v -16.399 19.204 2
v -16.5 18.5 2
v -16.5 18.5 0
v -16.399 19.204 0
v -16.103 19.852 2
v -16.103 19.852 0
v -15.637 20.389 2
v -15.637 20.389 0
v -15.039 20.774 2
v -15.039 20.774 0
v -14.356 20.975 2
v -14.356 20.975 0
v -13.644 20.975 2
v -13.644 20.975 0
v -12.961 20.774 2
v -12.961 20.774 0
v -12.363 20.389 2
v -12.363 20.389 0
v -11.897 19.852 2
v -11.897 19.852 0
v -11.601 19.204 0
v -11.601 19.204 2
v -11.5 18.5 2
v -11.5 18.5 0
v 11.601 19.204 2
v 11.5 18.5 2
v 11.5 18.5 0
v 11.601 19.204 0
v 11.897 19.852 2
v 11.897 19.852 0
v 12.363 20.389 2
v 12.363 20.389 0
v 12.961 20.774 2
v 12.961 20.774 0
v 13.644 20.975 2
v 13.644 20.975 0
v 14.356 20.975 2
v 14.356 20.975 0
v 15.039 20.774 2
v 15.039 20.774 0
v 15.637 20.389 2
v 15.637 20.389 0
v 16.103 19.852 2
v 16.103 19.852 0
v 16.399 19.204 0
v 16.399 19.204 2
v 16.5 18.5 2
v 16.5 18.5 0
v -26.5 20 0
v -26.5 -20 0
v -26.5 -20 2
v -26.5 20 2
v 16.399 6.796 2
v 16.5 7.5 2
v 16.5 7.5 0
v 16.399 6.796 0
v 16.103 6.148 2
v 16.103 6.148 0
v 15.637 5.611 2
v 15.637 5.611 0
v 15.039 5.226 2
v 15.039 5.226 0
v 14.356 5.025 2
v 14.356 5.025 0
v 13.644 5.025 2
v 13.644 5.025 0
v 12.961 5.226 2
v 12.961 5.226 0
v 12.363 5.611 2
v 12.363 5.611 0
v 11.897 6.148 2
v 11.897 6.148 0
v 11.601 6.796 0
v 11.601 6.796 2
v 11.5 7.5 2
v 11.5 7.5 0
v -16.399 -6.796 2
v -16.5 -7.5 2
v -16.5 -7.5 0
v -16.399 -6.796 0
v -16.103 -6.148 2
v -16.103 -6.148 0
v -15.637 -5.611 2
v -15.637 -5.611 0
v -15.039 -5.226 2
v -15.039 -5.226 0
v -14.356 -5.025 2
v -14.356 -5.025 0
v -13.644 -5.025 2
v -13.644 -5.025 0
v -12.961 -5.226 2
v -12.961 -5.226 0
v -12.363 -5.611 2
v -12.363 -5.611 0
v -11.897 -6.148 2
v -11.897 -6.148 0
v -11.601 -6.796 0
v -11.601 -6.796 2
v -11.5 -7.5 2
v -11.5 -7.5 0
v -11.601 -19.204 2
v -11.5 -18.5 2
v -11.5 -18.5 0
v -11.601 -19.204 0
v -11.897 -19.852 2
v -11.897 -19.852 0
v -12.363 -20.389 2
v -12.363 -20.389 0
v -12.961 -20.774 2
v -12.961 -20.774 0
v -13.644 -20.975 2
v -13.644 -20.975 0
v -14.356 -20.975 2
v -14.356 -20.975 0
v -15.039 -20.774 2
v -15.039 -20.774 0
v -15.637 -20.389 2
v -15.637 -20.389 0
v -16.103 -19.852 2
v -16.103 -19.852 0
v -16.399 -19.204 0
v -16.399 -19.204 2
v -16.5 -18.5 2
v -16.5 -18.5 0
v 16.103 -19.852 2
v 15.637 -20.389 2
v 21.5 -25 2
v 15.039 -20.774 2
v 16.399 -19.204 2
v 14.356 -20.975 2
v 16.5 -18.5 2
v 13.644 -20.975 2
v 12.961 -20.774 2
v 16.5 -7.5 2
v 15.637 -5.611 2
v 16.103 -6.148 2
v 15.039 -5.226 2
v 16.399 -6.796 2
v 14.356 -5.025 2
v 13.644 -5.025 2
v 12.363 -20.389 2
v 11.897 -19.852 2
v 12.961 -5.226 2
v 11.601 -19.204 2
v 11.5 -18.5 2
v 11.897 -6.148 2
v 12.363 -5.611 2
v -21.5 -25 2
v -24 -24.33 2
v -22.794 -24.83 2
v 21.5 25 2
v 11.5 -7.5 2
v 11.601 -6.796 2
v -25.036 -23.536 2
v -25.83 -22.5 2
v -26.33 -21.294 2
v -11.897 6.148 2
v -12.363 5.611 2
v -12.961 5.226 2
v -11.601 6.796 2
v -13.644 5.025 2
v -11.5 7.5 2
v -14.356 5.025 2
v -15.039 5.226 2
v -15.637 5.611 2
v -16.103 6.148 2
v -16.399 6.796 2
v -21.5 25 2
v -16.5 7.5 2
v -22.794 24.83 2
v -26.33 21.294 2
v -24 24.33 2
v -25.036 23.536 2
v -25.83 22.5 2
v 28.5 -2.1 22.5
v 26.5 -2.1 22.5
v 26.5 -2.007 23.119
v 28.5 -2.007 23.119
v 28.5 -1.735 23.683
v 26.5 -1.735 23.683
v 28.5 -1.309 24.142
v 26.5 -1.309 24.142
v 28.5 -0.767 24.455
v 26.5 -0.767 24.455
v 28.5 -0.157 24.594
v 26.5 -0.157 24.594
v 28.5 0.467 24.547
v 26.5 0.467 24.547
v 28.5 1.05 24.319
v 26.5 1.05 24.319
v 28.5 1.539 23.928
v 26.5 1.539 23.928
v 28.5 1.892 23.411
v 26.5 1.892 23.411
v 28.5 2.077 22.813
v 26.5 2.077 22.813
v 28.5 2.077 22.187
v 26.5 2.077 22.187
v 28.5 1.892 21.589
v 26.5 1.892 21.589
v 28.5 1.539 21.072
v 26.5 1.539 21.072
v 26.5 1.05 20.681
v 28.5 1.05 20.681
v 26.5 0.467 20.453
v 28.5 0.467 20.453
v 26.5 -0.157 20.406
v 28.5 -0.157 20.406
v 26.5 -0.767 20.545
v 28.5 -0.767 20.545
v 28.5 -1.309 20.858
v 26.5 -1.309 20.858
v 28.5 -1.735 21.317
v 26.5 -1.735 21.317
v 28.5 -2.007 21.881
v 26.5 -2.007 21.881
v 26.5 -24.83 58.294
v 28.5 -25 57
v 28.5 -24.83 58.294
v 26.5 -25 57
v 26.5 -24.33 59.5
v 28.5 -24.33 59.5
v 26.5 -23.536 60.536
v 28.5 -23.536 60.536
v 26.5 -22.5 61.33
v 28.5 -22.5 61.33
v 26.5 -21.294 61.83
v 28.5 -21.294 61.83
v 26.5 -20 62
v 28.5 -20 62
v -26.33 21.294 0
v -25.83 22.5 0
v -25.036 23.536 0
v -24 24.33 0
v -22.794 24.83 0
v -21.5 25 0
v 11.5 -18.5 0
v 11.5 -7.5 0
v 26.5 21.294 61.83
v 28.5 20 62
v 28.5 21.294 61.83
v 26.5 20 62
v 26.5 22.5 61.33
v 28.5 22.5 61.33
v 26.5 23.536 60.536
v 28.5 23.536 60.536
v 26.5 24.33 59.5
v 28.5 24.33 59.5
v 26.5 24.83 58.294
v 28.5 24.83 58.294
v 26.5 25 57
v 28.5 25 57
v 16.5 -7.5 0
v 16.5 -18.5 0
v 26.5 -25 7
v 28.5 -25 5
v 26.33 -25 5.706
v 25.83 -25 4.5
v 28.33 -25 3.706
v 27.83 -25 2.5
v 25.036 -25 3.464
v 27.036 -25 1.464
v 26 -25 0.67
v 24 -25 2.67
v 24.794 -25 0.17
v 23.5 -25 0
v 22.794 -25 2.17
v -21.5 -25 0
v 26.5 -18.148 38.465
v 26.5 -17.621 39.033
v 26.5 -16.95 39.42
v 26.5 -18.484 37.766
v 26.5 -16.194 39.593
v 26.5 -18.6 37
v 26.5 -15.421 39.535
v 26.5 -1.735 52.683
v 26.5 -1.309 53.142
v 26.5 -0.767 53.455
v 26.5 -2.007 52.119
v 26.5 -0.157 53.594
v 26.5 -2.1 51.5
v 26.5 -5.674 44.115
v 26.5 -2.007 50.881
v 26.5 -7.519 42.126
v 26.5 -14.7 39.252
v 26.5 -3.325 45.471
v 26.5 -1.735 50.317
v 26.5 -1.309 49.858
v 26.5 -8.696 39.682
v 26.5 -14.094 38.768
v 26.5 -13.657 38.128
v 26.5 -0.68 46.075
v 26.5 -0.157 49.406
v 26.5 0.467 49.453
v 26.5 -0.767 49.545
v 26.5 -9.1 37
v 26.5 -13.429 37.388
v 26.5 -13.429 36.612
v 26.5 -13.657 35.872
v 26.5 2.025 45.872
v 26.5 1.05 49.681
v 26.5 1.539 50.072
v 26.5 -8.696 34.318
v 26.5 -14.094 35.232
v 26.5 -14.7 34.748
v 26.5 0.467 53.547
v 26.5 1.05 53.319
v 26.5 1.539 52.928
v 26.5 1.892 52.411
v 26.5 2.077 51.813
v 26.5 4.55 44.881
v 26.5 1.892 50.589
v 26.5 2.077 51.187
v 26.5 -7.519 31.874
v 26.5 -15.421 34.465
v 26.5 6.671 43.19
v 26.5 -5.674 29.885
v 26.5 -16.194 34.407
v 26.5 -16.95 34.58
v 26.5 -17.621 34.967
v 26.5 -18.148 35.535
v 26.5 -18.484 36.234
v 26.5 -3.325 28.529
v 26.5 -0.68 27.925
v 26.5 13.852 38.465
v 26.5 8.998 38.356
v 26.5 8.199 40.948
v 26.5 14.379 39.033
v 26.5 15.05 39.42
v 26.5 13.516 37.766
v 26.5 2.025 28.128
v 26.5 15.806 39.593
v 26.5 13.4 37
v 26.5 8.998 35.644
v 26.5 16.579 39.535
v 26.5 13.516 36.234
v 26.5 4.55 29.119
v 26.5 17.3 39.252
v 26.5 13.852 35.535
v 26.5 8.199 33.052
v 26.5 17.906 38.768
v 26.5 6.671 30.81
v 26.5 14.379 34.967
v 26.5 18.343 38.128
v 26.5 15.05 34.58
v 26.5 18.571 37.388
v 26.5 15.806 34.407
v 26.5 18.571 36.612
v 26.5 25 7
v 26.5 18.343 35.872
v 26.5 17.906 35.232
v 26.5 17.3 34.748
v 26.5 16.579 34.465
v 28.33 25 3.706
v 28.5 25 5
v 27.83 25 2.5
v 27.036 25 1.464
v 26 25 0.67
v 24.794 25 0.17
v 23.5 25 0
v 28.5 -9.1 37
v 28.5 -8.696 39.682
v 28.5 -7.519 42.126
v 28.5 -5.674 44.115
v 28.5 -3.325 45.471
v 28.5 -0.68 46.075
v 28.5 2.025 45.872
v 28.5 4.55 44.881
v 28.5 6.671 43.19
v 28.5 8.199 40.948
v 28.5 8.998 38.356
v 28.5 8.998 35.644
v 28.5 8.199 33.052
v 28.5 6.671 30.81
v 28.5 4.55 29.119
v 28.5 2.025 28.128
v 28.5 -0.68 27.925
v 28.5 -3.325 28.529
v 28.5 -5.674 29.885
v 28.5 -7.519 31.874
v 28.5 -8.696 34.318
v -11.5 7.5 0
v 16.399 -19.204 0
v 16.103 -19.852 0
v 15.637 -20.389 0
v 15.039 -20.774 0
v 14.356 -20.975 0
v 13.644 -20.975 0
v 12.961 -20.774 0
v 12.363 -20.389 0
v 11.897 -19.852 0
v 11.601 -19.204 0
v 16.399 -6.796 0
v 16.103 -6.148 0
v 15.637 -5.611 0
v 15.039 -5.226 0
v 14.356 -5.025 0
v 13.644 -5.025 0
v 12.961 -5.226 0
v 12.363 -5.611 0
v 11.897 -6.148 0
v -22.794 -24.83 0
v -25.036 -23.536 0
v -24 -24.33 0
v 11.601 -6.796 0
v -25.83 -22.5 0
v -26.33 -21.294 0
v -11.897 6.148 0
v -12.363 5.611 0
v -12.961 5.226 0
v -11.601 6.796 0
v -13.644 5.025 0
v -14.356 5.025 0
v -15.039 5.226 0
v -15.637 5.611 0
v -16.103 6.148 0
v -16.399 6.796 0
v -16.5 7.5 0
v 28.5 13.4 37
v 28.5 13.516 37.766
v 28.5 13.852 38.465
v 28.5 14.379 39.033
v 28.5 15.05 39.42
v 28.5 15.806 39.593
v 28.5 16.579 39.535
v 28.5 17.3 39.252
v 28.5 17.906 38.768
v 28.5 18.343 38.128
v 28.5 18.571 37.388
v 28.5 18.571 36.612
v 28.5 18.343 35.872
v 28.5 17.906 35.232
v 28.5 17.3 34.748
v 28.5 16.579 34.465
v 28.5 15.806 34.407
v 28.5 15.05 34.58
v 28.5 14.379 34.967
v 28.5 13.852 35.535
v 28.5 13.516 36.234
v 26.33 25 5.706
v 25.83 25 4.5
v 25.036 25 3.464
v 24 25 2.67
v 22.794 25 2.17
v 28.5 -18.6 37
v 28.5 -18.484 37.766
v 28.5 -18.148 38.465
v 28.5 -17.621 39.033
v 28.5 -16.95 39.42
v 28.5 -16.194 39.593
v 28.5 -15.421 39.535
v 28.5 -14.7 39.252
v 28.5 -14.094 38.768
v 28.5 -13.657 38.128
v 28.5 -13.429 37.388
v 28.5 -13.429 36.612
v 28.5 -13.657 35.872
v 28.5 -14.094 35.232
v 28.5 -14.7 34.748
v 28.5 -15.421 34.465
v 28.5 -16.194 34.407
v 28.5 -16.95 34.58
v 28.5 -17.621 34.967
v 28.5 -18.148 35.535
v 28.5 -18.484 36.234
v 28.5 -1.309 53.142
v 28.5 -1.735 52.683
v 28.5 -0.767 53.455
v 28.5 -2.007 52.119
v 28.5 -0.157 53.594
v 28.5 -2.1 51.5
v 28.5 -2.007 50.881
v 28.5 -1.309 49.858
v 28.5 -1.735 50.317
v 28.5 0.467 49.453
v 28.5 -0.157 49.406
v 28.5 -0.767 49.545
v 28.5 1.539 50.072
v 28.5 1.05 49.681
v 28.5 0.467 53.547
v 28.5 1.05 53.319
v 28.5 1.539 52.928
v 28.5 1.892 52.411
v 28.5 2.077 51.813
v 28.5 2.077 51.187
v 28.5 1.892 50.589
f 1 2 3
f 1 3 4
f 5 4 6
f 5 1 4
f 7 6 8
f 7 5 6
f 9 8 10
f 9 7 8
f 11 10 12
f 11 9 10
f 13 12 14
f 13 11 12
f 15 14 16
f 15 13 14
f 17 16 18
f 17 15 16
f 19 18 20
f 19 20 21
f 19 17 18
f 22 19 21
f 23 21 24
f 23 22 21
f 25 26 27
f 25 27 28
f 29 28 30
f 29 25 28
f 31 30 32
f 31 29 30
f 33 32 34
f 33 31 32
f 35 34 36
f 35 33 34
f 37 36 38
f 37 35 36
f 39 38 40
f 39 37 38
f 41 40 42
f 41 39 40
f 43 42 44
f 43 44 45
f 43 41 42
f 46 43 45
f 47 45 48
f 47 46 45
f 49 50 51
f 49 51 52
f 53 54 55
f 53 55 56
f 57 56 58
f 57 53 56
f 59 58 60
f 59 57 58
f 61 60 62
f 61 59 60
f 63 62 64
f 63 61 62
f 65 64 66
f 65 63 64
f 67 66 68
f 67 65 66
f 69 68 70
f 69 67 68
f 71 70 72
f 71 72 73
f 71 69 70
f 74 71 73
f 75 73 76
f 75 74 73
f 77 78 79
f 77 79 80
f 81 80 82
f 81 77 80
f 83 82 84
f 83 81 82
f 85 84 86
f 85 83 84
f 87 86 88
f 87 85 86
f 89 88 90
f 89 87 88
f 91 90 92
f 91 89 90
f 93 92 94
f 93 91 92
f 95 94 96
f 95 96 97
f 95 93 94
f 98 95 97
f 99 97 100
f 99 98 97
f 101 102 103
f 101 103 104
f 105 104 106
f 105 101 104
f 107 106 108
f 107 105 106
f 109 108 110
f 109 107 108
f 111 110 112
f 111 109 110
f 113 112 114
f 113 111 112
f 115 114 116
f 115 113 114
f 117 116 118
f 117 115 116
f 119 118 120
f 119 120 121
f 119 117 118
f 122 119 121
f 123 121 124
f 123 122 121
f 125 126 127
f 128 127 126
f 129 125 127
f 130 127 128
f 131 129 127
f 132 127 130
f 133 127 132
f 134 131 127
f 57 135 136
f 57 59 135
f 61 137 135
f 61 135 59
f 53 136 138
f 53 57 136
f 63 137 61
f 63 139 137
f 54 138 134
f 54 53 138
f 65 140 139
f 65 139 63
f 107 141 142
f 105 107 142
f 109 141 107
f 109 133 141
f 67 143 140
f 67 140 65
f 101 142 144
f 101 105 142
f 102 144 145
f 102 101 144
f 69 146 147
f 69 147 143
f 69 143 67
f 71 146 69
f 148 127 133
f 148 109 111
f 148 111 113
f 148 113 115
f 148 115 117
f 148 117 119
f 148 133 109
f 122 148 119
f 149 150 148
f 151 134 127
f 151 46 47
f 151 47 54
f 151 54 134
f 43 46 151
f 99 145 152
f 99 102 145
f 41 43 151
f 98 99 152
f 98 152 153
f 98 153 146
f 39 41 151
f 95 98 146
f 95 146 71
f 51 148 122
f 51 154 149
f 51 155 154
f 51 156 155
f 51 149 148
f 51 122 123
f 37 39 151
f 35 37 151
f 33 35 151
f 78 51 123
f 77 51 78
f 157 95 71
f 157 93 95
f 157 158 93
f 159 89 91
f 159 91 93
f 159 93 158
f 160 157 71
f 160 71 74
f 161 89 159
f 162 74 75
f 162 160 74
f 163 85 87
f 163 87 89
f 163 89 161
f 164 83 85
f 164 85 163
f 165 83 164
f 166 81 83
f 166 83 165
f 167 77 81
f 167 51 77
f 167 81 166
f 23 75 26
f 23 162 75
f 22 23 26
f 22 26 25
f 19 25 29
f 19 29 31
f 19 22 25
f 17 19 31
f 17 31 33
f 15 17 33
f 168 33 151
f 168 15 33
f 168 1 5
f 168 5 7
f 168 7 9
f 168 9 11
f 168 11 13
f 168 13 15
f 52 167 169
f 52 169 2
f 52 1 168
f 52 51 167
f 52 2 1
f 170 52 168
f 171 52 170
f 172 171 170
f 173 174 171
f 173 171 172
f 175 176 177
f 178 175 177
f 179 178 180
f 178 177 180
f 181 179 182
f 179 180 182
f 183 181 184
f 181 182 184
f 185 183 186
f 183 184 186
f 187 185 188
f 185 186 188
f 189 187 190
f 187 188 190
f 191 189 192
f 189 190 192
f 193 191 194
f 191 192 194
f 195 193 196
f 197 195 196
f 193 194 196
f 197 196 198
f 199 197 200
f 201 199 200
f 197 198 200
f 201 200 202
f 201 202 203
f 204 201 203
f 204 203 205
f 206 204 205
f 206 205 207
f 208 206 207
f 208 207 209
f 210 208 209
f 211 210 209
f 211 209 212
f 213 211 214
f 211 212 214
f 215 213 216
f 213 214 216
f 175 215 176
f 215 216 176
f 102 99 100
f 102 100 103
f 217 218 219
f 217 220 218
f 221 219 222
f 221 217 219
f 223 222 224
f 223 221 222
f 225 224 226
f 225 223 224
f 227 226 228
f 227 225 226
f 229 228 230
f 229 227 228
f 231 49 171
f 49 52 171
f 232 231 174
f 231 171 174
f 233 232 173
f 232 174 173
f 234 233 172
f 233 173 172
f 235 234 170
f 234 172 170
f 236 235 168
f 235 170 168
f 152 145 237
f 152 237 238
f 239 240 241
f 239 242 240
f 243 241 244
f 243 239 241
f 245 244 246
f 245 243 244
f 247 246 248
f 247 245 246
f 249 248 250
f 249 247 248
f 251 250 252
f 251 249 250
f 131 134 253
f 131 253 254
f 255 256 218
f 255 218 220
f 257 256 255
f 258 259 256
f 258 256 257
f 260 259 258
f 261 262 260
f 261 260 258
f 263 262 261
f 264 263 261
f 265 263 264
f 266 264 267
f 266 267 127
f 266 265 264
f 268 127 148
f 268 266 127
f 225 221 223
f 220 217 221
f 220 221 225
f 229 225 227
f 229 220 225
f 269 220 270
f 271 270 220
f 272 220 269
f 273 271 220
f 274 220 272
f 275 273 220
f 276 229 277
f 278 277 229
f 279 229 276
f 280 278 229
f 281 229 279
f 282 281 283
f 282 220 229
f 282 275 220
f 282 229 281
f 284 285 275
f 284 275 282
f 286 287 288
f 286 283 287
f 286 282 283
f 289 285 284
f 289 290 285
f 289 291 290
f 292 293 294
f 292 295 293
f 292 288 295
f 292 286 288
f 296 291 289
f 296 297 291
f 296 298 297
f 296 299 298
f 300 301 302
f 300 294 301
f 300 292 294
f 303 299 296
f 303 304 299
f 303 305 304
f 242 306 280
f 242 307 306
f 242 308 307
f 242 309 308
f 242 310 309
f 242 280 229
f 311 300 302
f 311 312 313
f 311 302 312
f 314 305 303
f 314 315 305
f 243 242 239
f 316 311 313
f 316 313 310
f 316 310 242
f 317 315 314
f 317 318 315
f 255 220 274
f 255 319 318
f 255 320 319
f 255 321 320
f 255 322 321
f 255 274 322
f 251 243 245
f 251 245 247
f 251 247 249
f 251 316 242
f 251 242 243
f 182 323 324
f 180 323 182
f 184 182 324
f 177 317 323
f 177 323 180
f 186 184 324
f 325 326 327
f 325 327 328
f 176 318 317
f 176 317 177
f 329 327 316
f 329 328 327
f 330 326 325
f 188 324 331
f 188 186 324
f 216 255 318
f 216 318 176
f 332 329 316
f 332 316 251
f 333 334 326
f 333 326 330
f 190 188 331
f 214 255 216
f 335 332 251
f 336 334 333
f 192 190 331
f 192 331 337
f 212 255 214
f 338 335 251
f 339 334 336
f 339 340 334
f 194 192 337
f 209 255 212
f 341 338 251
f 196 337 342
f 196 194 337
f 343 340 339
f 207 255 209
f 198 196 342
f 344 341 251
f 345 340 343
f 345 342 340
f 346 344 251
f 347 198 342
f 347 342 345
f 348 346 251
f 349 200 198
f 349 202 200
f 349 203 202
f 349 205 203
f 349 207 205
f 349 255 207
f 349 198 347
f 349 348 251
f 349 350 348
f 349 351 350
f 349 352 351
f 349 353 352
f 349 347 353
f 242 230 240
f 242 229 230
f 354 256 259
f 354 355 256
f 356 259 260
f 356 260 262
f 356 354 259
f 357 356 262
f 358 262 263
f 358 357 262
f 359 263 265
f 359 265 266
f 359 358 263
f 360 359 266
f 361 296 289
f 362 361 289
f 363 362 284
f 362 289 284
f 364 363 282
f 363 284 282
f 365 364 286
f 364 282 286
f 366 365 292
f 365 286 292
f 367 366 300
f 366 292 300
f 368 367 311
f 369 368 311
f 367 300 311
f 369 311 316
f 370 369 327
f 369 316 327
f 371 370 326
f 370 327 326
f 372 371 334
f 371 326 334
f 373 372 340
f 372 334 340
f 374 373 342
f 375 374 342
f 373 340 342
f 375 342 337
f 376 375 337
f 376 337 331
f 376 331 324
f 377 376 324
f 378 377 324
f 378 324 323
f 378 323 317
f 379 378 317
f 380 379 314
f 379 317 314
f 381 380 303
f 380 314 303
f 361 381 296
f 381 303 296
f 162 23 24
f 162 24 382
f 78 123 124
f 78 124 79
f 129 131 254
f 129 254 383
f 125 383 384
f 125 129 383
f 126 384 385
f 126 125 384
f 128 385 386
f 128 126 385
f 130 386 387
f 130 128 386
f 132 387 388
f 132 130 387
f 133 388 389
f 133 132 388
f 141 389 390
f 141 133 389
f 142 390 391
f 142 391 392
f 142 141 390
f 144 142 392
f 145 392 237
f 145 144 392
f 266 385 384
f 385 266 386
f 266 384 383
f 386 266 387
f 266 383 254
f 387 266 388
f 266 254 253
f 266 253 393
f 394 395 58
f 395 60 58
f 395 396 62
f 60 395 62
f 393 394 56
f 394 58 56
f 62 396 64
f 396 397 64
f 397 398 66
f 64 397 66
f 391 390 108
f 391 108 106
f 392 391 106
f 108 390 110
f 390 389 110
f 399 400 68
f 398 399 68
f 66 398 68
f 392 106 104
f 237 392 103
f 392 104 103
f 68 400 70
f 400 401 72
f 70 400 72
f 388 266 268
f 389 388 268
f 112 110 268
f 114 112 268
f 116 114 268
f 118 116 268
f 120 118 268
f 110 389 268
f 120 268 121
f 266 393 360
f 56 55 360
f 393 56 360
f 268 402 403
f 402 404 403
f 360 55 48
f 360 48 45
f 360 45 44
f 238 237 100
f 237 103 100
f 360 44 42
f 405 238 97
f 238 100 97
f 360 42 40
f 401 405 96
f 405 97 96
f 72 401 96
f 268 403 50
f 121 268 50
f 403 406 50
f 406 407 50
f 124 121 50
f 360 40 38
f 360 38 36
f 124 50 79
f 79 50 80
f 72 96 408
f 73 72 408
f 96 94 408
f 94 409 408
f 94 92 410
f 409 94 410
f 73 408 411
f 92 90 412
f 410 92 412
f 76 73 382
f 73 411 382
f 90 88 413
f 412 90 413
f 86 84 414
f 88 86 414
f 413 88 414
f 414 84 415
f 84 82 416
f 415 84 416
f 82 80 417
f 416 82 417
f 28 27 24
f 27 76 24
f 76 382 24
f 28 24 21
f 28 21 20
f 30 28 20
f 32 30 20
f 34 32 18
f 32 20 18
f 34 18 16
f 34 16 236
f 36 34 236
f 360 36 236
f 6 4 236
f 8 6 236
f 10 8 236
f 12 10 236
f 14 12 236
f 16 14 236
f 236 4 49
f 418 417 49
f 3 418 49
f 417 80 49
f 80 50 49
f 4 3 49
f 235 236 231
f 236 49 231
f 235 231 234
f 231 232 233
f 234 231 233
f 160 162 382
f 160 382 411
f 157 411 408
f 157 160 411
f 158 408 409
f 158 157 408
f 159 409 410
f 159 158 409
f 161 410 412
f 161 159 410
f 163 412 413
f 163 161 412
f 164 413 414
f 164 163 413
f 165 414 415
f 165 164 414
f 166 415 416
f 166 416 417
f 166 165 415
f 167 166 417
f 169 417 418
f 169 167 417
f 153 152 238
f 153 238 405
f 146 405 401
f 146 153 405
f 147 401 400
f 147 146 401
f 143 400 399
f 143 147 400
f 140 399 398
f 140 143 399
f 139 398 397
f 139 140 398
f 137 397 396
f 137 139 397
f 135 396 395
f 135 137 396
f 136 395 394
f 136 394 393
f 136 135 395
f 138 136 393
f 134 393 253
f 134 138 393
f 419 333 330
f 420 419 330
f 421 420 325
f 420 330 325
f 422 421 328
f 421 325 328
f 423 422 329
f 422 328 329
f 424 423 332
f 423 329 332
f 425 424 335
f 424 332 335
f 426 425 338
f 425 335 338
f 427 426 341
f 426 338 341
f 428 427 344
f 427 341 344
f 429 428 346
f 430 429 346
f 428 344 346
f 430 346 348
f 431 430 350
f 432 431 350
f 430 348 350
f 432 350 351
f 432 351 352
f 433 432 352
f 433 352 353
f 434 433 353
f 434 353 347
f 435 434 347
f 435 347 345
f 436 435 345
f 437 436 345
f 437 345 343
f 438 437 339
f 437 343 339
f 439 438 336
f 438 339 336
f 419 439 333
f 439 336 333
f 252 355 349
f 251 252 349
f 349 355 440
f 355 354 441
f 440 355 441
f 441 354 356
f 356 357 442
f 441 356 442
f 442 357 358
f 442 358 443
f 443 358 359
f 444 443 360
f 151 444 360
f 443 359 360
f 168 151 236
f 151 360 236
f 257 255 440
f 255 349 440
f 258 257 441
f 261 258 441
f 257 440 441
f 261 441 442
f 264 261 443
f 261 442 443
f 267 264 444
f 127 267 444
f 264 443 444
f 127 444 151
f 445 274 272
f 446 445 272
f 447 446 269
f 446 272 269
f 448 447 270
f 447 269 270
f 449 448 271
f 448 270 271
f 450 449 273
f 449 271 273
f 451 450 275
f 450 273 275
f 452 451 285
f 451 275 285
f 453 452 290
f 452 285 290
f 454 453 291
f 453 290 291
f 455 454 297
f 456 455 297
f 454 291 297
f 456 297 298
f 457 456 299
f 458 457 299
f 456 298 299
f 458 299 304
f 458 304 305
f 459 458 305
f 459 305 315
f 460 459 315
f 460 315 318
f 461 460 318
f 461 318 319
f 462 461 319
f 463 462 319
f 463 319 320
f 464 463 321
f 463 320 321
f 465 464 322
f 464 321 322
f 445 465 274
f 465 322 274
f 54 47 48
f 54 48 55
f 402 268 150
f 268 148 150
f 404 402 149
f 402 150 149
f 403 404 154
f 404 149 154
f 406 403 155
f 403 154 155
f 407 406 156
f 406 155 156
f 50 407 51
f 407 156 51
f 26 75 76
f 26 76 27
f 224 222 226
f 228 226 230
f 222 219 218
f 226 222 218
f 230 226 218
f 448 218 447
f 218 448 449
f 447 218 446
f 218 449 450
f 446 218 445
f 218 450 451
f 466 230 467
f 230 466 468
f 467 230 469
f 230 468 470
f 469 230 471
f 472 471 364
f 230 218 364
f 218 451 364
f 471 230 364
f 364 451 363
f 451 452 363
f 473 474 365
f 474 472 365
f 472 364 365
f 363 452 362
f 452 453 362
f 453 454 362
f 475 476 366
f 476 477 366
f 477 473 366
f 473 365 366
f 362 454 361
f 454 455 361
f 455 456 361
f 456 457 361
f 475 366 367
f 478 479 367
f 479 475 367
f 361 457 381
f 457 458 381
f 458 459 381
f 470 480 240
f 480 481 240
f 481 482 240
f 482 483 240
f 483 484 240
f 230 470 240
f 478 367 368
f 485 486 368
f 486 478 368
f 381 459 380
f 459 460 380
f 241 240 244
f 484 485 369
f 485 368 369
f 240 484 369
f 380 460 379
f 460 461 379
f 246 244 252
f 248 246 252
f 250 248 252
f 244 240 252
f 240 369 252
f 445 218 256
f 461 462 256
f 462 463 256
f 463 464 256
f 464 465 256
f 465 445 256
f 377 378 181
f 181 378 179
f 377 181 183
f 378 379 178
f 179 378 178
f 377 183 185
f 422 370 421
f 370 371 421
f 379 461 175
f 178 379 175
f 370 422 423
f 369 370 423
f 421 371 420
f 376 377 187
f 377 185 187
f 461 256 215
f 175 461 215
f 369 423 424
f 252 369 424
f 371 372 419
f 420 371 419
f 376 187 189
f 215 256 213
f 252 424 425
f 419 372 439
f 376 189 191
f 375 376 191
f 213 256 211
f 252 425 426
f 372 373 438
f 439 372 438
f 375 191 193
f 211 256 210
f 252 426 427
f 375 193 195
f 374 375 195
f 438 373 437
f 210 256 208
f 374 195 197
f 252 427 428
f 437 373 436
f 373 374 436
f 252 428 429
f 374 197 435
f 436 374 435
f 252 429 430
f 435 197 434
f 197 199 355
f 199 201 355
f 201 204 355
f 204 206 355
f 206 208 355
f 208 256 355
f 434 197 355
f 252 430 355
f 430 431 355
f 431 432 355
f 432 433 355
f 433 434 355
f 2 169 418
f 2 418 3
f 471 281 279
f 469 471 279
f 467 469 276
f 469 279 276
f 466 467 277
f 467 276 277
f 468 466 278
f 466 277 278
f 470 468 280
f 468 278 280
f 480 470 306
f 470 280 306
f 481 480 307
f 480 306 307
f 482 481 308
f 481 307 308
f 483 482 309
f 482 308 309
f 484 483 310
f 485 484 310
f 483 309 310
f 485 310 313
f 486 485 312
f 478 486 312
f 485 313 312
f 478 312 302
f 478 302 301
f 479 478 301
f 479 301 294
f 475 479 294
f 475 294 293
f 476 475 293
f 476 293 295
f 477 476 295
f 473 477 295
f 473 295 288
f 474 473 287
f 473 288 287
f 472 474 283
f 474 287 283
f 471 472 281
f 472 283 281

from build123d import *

# Parameters (mm, degrees)
SKETCH1_W           = 50
SKETCH1_H           = 53
BOSS_EXTRUDE1_DEPTH = 2
SKETCH2_W           = 50
SKETCH2_H           = 2
BOSS_EXTRUDE2_DEPTH = 62
SKETCH3_R           = 9.1
SKETCH3_R_2         = 2.6
SKETCH3_R_3         = 2.1
CUT_EXTRUDE1_DEPTH  = 2
CUT_EXTRUDE2_DEPTH  = 2
FILLET1_R           = 5


with BuildPart() as part:
    # Sketch1 → Boss-Extrude1 (new body)
    with BuildSketch(Plane(origin=(0, 0, 0), x_dir=(0, 1, 0), z_dir=(0, 0, 1))):
        Rectangle(SKETCH1_W, SKETCH1_H)
    extrude(amount=BOSS_EXTRUDE1_DEPTH)

    # Sketch2 → Boss-Extrude2 (add)
    with BuildSketch(Plane(origin=(0, 0, 0), x_dir=(0, 1, 0), z_dir=(0, 0, 1))):
        with Locations((0, -27.5)):
            Rectangle(SKETCH2_W, SKETCH2_H)
    extrude(amount=BOSS_EXTRUDE2_DEPTH)

    # Sketch3 → Cut-Extrude1 (cut)
    with BuildSketch(Plane(origin=(26.5, 0, 0), x_dir=(0, -1, 0), z_dir=(-1, 0, 0))):
        with Locations((0, 37)):
            Circle(SKETCH3_R)
        with Locations((16, 37)):
            Circle(SKETCH3_R_2)
        with Locations((-16, 37)):
            Circle(SKETCH3_R_2)
        with Locations((0, 51.5)):
            Circle(SKETCH3_R_3)
        with Locations((0, 22.5)):
            Circle(SKETCH3_R_3)
    extrude(amount=-CUT_EXTRUDE1_DEPTH, mode=Mode.SUBTRACT)

    # Sketch4 → Cut-Extrude2 (cut)
    with BuildSketch(Plane.XY.offset(2)):
        with BuildLine():
            Line((-11.5, 18.5), (-11.5, 7.5))
            ThreePointArc((-11.5, 7.5), (-14, 5), (-16.5, 7.5))
            Line((-16.5, 7.5), (-16.5, 18.5))
            ThreePointArc((-16.5, 18.5), (-14, 21), (-11.5, 18.5))
        make_face()
        with BuildLine():
            Line((-11.5, -7.5), (-11.5, -18.5))
            ThreePointArc((-11.5, -18.5), (-14, -21), (-16.5, -18.5))
            Line((-16.5, -18.5), (-16.5, -7.5))
            ThreePointArc((-16.5, -7.5), (-14, -5), (-11.5, -7.5))
        make_face()
        with BuildLine():
            Line((16.5, 18.5), (16.5, 7.5))
            ThreePointArc((16.5, 7.5), (14, 5), (11.5, 7.5))
            Line((11.5, 7.5), (11.5, 18.5))
            ThreePointArc((11.5, 18.5), (14, 21), (16.5, 18.5))
        make_face()
        with BuildLine():
            Line((16.5, -7.5), (16.5, -18.5))
            ThreePointArc((16.5, -18.5), (14, -21), (11.5, -18.5))
            Line((11.5, -18.5), (11.5, -7.5))
            ThreePointArc((11.5, -7.5), (14, -5), (16.5, -7.5))
        make_face()
    extrude(amount=-CUT_EXTRUDE2_DEPTH, mode=Mode.SUBTRACT)

    # Fillet1
    fillet1_edges = [part.edges().sort_by_distance(p)[0] for p in [
        (28.5, 0, 0),
        (27.5, -25, 62),
        (26.5, 0, 2),
        (27.5, 25, 62),
        (-26.5, -25, 1),
        (-26.5, 25, 1),
    ]]
    fillet(fillet1_edges, radius=FILLET1_R)


solid = part.part
